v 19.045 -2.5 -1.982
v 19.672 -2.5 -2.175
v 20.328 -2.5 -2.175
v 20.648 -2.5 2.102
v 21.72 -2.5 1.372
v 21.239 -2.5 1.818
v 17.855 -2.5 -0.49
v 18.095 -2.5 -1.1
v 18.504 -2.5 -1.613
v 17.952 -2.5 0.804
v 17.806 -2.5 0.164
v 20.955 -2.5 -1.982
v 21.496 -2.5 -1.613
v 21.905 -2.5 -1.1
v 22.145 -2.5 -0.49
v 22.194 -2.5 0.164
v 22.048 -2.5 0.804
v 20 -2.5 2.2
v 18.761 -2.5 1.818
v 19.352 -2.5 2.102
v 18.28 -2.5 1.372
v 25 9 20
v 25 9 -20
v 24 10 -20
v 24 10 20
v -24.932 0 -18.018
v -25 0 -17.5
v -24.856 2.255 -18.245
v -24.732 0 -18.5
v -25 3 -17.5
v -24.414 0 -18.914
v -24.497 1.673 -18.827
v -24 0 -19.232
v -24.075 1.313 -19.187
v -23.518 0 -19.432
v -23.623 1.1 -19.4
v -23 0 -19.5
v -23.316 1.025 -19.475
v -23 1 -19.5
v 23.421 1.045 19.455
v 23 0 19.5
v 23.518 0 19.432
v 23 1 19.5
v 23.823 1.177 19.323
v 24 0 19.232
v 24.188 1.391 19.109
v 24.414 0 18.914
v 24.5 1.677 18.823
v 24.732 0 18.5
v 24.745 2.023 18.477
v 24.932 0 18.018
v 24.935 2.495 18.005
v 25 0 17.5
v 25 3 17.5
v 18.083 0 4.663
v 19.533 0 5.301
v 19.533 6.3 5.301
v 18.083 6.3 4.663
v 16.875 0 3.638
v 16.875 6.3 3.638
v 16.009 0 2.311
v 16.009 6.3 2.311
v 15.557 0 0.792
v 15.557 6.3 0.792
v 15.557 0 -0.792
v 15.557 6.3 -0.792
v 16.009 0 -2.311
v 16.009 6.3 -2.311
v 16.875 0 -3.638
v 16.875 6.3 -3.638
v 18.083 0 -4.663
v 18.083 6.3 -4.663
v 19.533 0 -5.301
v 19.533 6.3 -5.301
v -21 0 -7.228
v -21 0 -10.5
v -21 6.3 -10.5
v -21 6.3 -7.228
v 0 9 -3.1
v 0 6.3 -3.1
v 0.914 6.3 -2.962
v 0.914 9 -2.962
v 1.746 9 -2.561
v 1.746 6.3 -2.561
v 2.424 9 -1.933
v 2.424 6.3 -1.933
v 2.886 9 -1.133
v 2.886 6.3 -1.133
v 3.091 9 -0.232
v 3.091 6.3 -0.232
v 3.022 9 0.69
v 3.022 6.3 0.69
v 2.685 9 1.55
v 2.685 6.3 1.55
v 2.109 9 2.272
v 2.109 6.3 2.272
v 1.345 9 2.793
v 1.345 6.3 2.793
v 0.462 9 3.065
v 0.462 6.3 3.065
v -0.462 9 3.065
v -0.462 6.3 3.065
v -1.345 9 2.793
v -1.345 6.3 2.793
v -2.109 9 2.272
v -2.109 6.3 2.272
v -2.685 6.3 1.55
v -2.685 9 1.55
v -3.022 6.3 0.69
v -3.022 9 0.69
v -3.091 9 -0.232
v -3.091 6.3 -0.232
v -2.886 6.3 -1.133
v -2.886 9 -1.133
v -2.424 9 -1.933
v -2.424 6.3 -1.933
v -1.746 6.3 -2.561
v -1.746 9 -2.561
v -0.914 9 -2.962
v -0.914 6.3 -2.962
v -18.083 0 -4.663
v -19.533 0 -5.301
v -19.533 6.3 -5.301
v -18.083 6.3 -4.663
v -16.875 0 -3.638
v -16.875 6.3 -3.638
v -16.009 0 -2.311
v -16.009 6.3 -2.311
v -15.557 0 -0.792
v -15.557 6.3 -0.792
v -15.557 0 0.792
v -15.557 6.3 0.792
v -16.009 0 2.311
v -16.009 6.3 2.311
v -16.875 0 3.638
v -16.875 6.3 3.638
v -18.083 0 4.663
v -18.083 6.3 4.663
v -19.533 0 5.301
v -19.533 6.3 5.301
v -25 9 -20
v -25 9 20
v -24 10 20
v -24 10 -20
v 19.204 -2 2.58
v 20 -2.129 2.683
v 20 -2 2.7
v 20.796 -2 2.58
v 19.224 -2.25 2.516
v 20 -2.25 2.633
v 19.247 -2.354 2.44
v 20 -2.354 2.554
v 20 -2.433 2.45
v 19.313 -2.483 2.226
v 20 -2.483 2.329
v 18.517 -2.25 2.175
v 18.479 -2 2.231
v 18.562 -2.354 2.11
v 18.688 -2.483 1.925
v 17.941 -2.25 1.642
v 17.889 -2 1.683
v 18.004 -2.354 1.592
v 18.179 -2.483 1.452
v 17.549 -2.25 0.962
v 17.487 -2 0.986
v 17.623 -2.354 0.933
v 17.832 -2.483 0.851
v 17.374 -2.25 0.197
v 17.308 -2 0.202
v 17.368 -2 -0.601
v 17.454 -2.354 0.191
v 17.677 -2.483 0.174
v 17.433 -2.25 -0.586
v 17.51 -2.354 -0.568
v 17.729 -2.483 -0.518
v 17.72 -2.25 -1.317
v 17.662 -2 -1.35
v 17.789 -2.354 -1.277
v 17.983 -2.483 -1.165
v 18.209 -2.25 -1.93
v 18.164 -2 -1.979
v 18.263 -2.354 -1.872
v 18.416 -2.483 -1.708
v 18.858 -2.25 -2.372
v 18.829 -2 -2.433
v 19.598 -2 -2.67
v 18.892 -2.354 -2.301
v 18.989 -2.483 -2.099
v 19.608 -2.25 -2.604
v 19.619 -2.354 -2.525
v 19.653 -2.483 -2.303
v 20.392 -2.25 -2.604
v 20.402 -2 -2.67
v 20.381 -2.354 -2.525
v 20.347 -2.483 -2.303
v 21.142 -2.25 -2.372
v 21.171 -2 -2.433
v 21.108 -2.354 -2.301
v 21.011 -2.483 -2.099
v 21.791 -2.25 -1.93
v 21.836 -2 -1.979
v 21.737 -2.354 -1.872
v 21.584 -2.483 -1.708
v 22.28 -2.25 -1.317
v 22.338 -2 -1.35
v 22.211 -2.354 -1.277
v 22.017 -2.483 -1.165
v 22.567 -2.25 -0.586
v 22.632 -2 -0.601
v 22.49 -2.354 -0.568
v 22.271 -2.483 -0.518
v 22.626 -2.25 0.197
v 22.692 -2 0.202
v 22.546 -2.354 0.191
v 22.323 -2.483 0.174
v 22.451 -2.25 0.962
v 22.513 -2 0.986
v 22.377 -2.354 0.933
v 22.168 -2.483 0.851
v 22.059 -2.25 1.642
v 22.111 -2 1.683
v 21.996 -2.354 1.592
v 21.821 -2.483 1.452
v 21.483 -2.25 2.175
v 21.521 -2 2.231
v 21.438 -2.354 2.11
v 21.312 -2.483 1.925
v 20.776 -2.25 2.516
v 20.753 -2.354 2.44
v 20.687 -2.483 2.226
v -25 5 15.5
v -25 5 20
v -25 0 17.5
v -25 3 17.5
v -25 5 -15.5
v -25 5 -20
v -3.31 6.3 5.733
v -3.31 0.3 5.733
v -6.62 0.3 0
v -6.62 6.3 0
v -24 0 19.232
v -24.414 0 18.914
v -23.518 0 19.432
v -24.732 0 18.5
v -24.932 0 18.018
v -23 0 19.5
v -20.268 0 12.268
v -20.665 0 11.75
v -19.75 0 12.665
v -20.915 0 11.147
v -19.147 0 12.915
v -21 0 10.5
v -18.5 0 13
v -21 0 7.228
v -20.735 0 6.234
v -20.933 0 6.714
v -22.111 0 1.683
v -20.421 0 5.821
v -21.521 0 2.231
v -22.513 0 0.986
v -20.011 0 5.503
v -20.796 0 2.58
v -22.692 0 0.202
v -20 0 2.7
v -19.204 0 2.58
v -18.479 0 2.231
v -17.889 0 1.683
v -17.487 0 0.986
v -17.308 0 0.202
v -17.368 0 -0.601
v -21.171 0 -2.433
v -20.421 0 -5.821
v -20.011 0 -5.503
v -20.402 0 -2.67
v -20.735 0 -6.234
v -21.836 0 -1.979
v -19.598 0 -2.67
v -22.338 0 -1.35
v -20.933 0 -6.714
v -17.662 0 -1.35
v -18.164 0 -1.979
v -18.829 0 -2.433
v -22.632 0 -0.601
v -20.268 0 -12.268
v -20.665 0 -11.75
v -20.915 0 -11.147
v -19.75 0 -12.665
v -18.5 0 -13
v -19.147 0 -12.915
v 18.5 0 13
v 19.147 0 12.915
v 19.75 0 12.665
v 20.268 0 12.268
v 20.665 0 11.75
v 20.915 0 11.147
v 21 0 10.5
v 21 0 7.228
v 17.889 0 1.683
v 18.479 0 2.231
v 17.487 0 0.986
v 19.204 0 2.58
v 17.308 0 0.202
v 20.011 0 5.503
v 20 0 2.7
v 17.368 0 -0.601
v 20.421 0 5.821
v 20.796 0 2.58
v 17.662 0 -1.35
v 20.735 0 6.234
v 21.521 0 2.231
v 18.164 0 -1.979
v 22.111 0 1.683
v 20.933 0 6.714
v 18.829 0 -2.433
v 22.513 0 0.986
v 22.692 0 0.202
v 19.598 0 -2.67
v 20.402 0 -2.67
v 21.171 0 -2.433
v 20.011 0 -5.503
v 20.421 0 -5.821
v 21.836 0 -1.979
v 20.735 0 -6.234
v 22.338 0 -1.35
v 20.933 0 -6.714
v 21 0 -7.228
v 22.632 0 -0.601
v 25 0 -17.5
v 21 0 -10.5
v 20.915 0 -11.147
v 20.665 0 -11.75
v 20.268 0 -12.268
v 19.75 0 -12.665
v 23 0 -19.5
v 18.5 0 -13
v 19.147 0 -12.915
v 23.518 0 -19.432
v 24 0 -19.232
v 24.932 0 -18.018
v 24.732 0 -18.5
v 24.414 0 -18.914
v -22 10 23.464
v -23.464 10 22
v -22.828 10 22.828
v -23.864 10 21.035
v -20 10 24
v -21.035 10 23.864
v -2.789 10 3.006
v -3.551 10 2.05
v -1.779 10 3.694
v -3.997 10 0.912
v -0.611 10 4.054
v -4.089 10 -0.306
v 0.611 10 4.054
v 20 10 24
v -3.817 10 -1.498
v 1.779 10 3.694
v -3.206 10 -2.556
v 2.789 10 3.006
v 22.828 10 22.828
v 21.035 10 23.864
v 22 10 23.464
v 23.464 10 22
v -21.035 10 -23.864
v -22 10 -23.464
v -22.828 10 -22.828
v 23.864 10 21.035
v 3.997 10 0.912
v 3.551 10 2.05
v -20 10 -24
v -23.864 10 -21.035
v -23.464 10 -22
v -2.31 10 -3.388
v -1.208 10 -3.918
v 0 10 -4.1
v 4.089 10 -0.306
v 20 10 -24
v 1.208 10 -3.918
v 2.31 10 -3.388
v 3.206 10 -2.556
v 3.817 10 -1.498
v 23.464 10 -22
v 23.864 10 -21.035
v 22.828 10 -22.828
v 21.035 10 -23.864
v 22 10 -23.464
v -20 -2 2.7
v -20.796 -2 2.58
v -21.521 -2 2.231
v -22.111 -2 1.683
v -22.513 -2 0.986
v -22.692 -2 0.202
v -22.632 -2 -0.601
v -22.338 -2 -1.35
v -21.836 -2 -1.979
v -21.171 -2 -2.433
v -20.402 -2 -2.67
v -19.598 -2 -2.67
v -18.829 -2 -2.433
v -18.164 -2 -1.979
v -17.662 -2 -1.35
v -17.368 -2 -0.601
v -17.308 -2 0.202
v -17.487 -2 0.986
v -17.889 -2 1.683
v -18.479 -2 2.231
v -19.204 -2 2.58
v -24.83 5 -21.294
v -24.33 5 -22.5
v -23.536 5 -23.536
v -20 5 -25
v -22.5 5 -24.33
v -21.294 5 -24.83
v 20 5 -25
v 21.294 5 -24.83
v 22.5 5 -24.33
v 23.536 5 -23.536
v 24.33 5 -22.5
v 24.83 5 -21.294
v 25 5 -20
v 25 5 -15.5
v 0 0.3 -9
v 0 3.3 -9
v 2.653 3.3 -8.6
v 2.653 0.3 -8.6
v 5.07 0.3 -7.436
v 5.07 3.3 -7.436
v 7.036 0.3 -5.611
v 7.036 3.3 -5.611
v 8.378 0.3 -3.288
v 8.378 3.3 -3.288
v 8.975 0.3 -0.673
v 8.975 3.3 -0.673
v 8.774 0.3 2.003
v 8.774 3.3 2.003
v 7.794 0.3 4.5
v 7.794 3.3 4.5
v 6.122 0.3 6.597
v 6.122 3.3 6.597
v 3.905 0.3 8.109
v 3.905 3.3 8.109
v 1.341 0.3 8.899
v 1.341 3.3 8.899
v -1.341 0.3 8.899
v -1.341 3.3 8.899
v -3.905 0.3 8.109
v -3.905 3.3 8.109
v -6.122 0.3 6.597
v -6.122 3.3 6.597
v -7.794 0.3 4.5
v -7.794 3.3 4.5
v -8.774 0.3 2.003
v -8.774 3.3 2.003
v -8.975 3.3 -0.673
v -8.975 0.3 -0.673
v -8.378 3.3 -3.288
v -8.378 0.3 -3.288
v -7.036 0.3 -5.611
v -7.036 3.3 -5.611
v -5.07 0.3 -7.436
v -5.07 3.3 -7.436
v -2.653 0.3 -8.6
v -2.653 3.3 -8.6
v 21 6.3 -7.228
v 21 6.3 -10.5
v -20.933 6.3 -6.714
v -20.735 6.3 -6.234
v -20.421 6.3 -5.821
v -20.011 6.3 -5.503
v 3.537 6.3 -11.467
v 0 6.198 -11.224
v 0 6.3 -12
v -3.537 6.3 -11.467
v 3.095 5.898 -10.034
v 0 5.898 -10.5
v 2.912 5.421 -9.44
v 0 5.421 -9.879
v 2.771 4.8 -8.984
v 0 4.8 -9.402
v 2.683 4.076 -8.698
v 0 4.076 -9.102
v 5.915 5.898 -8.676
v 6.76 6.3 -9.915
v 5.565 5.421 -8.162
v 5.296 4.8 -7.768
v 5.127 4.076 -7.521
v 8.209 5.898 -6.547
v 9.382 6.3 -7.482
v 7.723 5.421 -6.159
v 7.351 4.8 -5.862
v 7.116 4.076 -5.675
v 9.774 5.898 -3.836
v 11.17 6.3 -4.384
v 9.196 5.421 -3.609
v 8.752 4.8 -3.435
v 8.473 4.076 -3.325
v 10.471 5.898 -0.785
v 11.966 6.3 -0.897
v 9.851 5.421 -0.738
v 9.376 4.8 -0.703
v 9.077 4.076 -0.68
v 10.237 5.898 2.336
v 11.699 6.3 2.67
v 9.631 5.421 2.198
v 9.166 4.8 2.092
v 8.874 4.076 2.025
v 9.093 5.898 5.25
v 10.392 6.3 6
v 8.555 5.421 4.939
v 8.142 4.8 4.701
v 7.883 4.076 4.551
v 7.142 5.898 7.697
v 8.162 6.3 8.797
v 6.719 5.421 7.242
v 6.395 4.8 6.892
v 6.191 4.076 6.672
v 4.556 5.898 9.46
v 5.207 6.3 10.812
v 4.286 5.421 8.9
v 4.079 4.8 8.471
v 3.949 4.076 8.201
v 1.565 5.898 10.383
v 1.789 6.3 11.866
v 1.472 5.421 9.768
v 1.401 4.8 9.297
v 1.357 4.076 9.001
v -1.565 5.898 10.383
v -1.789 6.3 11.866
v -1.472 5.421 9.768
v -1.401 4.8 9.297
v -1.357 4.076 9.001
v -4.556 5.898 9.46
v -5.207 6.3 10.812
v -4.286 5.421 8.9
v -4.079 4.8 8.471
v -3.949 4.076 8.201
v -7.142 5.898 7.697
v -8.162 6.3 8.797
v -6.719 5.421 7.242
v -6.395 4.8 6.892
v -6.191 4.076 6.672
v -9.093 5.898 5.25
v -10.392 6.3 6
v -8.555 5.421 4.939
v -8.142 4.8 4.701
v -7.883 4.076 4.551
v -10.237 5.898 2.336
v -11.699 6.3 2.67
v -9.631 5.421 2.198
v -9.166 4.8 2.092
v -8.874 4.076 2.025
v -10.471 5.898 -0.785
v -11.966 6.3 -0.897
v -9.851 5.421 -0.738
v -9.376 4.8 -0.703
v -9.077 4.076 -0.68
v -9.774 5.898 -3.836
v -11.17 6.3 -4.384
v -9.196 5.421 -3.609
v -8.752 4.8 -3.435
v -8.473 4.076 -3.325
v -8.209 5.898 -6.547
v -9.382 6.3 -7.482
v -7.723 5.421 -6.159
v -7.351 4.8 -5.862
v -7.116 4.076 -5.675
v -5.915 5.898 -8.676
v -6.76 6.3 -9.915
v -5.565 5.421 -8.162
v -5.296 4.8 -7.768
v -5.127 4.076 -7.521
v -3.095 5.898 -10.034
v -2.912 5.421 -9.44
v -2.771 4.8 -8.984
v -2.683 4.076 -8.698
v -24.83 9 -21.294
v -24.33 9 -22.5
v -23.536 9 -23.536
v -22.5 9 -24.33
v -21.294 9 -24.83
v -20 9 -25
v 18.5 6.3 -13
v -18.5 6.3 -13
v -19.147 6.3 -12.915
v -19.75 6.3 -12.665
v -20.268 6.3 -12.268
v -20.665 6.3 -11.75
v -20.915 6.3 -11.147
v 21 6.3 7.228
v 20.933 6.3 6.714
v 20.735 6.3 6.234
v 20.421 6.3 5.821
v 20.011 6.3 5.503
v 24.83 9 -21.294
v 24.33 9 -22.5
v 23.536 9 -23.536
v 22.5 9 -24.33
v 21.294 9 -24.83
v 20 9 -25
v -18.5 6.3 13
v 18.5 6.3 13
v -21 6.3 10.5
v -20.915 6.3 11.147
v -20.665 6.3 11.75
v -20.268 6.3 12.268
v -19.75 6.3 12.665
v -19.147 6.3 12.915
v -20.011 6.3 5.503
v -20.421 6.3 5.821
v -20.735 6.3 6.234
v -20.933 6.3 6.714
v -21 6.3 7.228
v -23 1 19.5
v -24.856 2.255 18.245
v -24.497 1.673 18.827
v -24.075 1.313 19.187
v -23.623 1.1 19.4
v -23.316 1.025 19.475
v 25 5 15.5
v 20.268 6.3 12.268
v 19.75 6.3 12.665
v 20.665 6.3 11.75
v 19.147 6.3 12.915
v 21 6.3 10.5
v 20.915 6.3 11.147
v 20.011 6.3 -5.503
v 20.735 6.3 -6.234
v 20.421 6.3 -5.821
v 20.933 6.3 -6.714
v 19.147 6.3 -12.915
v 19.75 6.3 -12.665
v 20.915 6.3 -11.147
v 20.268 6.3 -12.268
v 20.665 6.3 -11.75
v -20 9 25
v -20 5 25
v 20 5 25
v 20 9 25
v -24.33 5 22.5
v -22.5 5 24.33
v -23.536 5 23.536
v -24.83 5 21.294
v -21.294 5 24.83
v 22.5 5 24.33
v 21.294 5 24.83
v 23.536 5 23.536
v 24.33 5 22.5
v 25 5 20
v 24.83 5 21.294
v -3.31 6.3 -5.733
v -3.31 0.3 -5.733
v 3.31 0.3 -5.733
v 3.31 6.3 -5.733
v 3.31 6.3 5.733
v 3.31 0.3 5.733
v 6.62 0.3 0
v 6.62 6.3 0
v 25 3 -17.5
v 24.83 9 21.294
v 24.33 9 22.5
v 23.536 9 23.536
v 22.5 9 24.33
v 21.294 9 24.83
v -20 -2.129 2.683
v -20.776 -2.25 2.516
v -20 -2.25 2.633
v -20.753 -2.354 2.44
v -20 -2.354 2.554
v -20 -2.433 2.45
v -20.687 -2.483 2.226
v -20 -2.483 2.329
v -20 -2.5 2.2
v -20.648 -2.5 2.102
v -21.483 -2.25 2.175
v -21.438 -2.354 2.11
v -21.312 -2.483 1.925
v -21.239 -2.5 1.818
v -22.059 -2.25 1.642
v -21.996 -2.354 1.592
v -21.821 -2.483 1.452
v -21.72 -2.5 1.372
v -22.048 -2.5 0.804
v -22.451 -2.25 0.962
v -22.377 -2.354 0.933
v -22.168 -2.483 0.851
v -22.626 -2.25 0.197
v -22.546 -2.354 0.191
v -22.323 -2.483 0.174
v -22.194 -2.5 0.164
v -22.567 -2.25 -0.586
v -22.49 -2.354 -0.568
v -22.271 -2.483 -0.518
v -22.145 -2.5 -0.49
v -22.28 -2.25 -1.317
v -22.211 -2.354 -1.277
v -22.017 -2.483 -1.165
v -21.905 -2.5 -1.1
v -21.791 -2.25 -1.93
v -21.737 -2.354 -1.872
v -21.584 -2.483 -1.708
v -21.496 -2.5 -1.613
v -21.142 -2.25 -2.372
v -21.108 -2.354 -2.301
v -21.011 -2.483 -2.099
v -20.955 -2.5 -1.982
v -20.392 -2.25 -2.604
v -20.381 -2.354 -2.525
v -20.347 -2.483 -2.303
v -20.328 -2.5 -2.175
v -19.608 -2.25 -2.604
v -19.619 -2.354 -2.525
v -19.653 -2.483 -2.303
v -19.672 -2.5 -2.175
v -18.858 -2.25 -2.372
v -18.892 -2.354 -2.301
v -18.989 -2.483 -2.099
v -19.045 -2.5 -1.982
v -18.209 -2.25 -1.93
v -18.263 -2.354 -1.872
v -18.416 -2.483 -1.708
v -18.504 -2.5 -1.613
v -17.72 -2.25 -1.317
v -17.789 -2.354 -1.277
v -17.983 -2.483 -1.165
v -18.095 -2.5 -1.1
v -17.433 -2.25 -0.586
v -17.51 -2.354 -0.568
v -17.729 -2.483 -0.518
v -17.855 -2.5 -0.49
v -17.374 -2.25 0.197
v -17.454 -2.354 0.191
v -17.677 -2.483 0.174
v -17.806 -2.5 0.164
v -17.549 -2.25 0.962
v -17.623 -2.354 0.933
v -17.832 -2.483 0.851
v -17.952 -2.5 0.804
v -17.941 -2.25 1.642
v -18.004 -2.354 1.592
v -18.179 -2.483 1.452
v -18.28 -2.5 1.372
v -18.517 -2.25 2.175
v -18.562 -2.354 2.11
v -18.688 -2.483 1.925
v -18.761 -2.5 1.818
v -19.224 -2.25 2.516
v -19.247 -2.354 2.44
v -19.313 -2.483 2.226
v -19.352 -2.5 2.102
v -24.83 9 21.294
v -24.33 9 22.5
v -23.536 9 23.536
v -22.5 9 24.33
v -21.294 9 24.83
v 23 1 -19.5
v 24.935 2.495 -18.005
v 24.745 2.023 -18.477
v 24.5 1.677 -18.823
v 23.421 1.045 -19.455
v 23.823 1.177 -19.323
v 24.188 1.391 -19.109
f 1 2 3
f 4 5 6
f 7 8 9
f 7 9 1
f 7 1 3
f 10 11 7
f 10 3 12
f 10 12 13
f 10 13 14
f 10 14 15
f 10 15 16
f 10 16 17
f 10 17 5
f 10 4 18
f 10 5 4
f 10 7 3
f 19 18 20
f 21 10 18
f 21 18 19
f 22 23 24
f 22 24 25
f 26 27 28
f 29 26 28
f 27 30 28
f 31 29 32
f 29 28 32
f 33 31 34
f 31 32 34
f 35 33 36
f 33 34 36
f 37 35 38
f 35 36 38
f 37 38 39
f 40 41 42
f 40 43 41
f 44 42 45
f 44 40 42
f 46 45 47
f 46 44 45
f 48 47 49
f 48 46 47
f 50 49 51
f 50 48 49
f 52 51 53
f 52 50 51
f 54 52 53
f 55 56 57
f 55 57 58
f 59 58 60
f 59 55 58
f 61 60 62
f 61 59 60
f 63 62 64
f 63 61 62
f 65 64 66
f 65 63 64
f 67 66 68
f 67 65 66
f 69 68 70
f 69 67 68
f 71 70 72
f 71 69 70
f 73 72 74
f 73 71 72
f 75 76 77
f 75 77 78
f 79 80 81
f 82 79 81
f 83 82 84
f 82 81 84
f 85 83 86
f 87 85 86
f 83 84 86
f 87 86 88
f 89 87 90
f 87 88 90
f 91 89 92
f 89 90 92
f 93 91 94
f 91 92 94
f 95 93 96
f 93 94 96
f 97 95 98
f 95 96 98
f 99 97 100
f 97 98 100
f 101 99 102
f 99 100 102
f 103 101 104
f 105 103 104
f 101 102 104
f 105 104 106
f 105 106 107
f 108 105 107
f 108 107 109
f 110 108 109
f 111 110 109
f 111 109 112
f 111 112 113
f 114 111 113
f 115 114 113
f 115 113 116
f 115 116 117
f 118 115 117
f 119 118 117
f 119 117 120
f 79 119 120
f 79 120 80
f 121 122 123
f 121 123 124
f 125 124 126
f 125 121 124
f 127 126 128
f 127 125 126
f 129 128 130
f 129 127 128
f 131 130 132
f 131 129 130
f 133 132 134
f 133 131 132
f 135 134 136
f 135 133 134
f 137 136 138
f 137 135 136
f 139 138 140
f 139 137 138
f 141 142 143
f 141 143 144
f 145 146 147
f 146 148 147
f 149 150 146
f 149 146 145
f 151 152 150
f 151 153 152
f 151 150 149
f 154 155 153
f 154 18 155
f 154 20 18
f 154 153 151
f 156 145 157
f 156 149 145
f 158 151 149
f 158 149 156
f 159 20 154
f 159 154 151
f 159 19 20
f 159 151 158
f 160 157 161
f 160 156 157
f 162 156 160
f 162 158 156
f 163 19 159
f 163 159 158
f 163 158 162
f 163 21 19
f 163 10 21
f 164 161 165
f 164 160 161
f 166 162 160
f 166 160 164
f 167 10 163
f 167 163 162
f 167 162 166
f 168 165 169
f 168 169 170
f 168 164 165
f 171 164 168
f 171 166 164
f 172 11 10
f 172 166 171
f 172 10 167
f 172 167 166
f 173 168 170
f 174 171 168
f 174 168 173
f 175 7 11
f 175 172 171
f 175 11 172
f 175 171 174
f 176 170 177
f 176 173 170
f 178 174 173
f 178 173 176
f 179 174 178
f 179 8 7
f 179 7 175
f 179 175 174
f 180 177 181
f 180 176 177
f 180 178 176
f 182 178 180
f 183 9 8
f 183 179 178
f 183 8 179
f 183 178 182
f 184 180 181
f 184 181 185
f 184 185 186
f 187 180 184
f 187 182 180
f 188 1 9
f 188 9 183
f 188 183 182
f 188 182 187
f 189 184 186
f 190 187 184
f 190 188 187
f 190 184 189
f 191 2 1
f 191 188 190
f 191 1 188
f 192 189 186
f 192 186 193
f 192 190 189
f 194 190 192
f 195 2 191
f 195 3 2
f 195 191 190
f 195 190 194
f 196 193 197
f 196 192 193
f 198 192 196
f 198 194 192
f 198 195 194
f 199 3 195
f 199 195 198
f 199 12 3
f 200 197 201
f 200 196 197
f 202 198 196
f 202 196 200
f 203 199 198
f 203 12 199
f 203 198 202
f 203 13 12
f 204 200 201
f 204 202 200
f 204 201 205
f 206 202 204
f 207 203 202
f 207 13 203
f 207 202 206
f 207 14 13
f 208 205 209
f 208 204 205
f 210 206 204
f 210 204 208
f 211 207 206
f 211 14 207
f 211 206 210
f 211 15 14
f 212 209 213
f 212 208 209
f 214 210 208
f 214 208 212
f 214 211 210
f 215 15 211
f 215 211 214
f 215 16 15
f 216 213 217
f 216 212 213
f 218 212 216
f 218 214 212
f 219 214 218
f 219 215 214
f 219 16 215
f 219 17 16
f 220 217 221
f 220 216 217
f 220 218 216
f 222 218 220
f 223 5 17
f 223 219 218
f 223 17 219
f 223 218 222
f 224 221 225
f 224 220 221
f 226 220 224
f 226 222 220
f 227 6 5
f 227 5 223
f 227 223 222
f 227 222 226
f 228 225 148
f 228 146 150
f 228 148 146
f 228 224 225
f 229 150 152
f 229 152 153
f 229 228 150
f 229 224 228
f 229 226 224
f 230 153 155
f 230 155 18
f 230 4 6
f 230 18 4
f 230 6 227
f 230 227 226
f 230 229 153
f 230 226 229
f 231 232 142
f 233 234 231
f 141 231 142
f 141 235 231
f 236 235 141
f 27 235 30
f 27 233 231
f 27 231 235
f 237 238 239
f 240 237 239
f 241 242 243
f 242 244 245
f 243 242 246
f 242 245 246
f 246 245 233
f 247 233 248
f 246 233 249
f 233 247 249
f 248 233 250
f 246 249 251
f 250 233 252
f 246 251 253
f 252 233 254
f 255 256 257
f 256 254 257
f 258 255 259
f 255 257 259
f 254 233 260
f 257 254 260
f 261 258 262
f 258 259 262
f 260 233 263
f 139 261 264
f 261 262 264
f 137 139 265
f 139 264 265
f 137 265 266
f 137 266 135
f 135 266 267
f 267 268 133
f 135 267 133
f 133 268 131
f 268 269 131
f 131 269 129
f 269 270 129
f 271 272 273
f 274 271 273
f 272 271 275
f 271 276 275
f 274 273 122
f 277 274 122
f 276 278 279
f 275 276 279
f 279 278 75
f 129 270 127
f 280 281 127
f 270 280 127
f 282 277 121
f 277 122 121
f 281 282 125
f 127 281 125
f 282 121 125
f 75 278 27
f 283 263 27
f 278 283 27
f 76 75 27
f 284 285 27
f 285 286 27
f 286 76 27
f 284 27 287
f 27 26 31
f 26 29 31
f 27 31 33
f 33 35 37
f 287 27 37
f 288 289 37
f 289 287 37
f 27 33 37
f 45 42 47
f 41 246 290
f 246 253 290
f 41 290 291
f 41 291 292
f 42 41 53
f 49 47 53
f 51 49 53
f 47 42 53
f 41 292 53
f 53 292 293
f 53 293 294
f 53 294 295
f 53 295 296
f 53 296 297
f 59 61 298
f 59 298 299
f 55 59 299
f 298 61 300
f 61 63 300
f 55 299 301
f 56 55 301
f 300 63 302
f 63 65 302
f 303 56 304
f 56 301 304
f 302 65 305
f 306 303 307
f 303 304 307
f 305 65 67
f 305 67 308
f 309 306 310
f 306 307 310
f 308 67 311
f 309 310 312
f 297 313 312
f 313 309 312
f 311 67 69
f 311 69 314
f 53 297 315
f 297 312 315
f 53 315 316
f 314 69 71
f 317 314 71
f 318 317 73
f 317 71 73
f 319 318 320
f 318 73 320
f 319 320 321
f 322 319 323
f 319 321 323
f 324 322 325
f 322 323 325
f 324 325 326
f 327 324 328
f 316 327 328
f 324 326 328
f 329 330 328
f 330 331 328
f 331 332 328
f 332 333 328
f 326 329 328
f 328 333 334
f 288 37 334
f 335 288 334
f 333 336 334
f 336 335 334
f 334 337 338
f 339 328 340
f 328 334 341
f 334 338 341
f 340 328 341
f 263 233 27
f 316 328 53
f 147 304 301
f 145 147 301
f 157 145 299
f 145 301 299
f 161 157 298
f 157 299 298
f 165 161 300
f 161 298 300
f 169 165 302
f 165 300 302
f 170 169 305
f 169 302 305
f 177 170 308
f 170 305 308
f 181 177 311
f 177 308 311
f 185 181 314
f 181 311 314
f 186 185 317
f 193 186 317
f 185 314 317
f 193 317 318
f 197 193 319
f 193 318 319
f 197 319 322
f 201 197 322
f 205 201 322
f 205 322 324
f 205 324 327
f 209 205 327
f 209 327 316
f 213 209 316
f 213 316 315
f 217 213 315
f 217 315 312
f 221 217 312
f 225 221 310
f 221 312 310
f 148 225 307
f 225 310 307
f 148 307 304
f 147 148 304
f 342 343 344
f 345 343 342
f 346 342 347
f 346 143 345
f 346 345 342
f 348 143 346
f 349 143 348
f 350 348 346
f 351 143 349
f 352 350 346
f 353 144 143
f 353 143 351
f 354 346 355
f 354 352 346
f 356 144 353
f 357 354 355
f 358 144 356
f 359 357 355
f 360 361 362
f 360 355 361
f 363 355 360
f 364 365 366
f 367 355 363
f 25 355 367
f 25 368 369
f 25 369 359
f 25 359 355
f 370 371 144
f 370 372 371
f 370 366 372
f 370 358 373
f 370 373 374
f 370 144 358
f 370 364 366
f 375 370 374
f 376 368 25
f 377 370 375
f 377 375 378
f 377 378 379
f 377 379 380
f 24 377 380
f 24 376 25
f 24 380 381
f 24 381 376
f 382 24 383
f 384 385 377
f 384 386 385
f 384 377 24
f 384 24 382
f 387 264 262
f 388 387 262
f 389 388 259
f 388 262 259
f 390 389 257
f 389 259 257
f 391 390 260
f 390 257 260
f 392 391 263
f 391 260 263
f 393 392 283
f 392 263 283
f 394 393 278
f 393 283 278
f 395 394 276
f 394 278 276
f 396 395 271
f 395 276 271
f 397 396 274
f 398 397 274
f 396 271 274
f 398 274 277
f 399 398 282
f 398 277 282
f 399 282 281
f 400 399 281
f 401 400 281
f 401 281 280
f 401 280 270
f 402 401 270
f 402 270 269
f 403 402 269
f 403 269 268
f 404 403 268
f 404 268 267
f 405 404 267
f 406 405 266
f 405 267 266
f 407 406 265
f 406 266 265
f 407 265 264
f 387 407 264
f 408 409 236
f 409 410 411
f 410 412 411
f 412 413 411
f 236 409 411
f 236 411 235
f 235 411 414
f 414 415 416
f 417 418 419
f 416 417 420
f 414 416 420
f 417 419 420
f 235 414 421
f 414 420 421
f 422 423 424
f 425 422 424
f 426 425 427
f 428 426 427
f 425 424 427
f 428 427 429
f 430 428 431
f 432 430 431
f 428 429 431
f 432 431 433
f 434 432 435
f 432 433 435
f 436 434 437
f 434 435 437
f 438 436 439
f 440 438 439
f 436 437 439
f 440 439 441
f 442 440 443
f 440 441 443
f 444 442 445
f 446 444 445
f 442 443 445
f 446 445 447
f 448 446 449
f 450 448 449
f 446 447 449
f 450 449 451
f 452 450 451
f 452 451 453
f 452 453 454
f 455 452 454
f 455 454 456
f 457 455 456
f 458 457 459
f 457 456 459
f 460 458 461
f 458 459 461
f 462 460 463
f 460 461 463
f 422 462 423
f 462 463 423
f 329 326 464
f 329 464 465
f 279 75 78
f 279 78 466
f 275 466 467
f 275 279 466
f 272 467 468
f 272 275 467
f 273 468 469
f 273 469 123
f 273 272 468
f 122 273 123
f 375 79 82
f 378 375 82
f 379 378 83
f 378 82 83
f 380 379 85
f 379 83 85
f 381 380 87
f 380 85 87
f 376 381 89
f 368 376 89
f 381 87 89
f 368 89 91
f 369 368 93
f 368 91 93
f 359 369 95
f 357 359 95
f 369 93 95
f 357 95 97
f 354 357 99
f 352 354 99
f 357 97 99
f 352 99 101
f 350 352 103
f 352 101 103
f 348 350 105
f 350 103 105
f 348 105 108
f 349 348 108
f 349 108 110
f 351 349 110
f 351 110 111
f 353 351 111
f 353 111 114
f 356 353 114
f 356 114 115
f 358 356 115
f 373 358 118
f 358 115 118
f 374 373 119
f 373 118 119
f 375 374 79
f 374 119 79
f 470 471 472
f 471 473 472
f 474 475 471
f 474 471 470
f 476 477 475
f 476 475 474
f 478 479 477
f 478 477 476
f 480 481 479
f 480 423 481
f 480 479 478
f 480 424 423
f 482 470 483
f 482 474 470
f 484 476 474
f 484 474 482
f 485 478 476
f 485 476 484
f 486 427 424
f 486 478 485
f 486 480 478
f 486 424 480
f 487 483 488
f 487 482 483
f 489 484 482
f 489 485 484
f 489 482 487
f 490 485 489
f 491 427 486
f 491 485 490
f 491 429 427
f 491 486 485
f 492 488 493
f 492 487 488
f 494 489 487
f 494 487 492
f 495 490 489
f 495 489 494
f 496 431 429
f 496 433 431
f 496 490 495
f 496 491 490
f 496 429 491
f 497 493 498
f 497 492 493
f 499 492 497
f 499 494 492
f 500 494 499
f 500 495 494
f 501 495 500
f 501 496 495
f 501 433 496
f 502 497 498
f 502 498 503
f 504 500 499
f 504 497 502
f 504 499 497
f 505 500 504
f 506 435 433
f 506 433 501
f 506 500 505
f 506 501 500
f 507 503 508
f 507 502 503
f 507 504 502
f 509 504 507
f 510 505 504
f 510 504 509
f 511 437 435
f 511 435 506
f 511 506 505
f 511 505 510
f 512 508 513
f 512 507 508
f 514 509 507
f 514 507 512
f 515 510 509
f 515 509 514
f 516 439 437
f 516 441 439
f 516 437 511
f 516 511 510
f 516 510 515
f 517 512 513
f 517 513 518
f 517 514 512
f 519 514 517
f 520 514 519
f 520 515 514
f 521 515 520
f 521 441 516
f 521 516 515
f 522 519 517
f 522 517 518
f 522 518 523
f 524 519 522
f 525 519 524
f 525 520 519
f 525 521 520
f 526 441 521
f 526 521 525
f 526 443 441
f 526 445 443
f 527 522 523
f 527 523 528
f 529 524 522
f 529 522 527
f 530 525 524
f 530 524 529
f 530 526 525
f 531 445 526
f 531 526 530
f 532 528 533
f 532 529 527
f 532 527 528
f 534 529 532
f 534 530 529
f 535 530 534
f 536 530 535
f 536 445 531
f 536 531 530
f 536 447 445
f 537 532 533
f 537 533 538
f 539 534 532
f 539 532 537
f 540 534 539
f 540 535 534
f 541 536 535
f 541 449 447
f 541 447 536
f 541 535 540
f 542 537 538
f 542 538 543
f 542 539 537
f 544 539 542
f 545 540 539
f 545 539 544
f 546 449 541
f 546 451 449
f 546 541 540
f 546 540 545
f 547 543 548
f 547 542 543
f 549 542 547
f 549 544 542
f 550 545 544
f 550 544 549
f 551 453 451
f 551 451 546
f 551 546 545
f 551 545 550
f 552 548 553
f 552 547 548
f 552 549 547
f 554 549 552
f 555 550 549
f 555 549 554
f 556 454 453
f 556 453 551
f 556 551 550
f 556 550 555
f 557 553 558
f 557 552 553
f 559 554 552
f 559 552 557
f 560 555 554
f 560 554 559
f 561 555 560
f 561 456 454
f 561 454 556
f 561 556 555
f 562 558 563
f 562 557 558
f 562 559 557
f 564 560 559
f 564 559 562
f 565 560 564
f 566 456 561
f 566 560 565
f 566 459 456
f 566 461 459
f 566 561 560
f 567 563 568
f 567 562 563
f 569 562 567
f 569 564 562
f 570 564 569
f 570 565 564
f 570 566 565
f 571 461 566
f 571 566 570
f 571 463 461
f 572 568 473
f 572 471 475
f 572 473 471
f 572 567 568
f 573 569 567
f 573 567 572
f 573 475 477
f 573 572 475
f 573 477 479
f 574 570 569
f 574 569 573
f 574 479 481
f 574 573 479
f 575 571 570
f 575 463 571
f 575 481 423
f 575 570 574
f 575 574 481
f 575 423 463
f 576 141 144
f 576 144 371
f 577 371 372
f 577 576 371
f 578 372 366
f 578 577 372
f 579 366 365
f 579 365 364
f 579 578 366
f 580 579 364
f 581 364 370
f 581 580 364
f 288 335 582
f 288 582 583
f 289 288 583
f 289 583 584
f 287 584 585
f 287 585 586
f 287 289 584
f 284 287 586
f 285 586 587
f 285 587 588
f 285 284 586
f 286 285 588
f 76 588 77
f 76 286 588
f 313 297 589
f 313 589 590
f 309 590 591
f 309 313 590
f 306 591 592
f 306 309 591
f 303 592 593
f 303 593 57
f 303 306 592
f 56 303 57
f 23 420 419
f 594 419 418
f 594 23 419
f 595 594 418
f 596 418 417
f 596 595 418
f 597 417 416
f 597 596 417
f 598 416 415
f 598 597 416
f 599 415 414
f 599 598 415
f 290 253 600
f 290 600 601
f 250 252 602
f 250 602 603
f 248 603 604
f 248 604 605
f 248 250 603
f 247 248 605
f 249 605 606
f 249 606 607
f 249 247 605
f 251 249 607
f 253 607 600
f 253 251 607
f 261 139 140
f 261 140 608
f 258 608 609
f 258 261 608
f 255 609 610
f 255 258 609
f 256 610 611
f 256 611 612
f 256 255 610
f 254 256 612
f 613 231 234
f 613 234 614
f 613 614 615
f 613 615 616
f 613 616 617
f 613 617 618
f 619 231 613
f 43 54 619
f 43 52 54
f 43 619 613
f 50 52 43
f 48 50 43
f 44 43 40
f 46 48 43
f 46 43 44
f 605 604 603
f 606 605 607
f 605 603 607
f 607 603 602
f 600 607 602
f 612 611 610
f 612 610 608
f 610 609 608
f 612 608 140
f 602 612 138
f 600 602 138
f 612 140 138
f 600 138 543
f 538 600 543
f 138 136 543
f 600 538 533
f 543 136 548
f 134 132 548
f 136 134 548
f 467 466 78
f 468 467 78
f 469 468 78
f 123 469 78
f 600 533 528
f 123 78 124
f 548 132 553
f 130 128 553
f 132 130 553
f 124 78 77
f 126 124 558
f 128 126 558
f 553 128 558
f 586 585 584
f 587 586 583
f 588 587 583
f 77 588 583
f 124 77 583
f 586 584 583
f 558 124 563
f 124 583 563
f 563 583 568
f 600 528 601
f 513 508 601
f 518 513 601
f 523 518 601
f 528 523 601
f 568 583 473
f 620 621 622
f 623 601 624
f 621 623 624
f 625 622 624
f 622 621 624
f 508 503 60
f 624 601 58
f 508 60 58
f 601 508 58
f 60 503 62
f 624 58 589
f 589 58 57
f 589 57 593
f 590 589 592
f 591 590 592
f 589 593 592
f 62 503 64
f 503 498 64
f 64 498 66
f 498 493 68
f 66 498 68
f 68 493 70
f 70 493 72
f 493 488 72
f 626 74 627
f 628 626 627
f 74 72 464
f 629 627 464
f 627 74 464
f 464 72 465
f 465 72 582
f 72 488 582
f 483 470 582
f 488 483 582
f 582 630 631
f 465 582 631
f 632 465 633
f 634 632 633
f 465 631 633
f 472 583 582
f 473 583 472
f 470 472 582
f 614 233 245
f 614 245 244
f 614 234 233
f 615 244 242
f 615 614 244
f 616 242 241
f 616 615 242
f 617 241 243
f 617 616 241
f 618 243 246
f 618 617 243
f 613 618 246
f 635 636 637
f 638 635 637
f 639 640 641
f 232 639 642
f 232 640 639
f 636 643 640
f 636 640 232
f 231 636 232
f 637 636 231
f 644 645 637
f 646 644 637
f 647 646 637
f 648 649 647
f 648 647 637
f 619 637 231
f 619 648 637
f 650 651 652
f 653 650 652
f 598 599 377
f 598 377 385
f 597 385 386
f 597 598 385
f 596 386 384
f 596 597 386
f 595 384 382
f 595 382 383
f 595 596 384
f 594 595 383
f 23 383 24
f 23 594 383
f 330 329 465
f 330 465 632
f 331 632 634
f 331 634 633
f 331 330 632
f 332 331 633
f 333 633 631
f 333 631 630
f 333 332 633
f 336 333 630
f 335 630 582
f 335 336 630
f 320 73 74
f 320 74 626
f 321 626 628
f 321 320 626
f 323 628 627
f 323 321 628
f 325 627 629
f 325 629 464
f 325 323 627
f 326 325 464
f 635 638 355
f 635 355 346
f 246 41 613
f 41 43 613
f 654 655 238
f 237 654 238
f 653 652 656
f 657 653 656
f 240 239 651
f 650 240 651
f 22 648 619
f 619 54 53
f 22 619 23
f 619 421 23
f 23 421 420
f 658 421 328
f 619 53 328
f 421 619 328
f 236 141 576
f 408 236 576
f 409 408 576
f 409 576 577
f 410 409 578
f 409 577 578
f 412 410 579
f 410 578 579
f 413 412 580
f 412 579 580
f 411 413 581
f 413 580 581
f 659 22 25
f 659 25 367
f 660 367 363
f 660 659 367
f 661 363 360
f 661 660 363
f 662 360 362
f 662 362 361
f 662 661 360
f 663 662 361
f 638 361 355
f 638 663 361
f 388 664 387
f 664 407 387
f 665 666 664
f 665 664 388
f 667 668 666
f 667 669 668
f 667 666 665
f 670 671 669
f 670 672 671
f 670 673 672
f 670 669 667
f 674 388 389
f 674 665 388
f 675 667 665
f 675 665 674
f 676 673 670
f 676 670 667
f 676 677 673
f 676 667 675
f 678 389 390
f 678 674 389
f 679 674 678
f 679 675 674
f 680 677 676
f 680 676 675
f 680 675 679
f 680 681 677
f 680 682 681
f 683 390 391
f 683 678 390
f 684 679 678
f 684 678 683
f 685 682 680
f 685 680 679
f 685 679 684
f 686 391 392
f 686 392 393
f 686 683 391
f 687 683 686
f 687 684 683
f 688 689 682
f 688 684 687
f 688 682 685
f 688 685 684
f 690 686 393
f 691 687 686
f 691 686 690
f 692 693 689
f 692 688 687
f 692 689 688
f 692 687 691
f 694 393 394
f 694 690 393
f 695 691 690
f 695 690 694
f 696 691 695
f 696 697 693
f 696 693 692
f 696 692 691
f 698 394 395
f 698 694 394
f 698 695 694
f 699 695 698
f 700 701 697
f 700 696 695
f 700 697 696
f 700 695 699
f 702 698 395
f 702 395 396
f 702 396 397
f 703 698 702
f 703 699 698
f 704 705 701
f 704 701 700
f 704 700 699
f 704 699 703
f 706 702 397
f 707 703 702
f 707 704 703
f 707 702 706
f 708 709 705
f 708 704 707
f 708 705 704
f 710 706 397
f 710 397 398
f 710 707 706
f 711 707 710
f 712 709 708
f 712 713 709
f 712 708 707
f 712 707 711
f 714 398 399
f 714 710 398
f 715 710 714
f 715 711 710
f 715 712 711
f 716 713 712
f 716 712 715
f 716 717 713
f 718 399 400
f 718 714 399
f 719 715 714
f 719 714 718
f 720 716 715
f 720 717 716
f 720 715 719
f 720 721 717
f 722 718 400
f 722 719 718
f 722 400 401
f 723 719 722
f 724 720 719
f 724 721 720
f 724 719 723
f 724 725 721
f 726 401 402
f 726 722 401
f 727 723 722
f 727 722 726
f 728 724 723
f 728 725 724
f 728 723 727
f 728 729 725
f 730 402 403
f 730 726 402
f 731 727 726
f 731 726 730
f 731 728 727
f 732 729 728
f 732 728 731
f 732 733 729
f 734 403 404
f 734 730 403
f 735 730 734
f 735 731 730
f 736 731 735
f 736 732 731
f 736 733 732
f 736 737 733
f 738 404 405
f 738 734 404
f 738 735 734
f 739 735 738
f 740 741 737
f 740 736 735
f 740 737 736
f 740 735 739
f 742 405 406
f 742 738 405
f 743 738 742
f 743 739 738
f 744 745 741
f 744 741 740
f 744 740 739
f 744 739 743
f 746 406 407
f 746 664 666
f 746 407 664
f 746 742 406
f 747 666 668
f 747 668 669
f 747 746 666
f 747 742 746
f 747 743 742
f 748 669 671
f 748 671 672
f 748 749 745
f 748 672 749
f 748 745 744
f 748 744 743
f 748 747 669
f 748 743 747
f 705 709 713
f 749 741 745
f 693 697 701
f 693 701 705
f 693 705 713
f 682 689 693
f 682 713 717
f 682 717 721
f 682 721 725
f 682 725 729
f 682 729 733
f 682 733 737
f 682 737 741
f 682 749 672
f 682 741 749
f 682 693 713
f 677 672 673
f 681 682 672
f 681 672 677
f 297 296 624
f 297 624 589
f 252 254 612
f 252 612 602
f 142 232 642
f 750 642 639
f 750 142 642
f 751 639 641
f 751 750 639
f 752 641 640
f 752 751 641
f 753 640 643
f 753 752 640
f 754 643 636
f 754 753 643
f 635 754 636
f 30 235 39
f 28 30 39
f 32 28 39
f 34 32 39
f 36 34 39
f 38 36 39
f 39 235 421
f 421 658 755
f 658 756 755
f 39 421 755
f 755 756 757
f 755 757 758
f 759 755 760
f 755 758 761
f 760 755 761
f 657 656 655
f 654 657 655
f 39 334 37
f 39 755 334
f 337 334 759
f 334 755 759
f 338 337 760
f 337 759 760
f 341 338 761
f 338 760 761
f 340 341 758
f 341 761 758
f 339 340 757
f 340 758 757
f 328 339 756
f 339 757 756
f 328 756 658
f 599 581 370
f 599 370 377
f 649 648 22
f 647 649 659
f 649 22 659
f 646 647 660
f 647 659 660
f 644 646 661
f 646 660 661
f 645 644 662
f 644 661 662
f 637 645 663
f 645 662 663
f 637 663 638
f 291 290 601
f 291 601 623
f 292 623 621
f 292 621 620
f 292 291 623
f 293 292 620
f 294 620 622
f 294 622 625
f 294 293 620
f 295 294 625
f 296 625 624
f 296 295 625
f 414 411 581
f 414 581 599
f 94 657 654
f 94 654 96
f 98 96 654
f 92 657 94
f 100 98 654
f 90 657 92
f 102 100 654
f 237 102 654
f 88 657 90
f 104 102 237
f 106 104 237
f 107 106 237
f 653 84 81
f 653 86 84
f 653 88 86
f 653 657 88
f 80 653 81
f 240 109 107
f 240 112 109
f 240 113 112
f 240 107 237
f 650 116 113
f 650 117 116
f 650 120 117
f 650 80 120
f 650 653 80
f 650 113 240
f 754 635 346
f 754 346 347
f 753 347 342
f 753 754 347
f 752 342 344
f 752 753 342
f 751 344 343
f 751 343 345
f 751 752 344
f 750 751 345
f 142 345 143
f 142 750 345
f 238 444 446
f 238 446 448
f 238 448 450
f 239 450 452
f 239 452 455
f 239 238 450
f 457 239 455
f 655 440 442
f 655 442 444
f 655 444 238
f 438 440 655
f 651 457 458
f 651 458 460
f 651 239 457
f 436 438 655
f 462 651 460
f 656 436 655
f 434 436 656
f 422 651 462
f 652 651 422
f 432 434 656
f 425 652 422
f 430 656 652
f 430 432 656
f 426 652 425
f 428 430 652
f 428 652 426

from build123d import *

# Parameters (mm, degrees)
SKETCH1_W           = 50
SKETCH1_H           = 50
BOSS_EXTRUDE1_DEPTH = 10
CUT_EXTRUDE3_DEPTH  = 6.3
SKETCH5_R           = 9
SKETCH5_R_2         = 3.1
BOSS_EXTRUDE2_DEPTH = 6
SKETCH6_R           = 2.7
BOSS_EXTRUDE3_DEPTH = 2.5
FILLET1_R           = 0.5
CUT_EXTRUDE4_DEPTH  = 57.789083458
FILLET2_R           = 5
CHAMFER1_SIZE       = 1
CHAMFER2_SIZE       = 1
CHAMFER2_SIZE2      = 1.414213562
FILLET3_R           = 2
SKETCH9_R           = 3.1
CUT_EXTRUDE5_DEPTH  = 37.434050008
CHAMFER3_SIZE       = 1
CUT_EXTRUDE6_DEPTH  = 6
FILLET4_R           = 3


with BuildPart() as part:
    # Sketch1 → Boss-Extrude1 (new body)
    with BuildSketch(Plane(origin=(0, 0, 0), x_dir=(1, 0, 0), z_dir=(0, 1, 0))):
        Rectangle(SKETCH1_W, SKETCH1_H)
    extrude(amount=BOSS_EXTRUDE1_DEPTH)

    # Sketch4 → Cut-Extrude3 (cut)
    with BuildSketch(Plane(origin=(0, 0, 0), x_dir=(-1, 0, 0), z_dir=(0, -1, 0))):
        with BuildLine():
            Line((21, -7.228416147), (21, -10.5))
            ThreePointArc((21, -10.5), (20.267766953, -12.267766953), (18.5, -13))
            Line((18.5, -13), (-18.5, -13))
            ThreePointArc((-18.5, -13), (-20.267766953, -12.267766953), (-21, -10.5))
            Line((-21, -10.5), (-21, -7.228416147))
            ThreePointArc((-21, -7.228416147), (-20.591644852, -6.017356006), (-19.533333333, -5.300838508))
            ThreePointArc((-19.533333333, -5.300838508), (-15.5, 0), (-19.533333333, 5.300838508))
            ThreePointArc((-19.533333333, 5.300838508), (-20.591644852, 6.017356006), (-21, 7.228416147))
            Line((-21, 7.228416147), (-21, 10.5))
            ThreePointArc((-21, 10.5), (-20.267766953, 12.267766953), (-18.5, 13))
            Line((-18.5, 13), (18.5, 13))
            ThreePointArc((18.5, 13), (20.267766953, 12.267766953), (21, 10.5))
            Line((21, 10.5), (21, 7.228416147))
            ThreePointArc((21, 7.228416147), (20.591644852, 6.017356006), (19.533333333, 5.300838508))
            ThreePointArc((19.533333333, 5.300838508), (15.5, 0), (19.533333333, -5.300838508))
            ThreePointArc((19.533333333, -5.300838508), (20.591644852, -6.017356006), (21, -7.228416147))
        make_face()
    extrude(amount=-CUT_EXTRUDE3_DEPTH, mode=Mode.SUBTRACT)

    # Sketch5 → Boss-Extrude2 (add)
    with BuildSketch(Plane(origin=(0, 6.3, 0), x_dir=(-1, 0, 0), z_dir=(0, -1, 0))):
        with Locations(Location((0, 0, 0), (0, 0, 90))):
            Circle(SKETCH5_R)
        with Locations(Location((0, 0, 0), (0, 0, 90))):
            Circle(SKETCH5_R_2, mode=Mode.SUBTRACT)
    extrude(amount=BOSS_EXTRUDE2_DEPTH)

    # Sketch6 → Boss-Extrude3 (add)
    with BuildSketch(Plane.XZ):
        with Locations(Location((-20, 0, 0), (0, 0, 90))):
            Circle(SKETCH6_R)
        with Locations(Location((20, 0, 0), (0, 0, 90))):
            Circle(SKETCH6_R)
    extrude(amount=BOSS_EXTRUDE3_DEPTH)

    # Fillet1
    fillet1_edges = [part.edges().sort_by_distance(p)[0] for p in [
        (-20, -2.5, -2.7),
        (20, -2.5, -2.7),
    ]]
    fillet(fillet1_edges, radius=FILLET1_R)

    # Sketch8 → Cut-Extrude4 (cut, through all)
    with BuildSketch(Plane(origin=(25, 0, 0), x_dir=(0, 0, -1), z_dir=(1, 0, 0))):
        Polygon((-25, 0), (-25, 5), (-15.5, 5), (-20.5, 0), align=None)
        Polygon((25, 0), (25, 5), (15.5, 5), (20.5, 0), align=None)
    extrude(amount=-CUT_EXTRUDE4_DEPTH, mode=Mode.SUBTRACT)

    # Fillet2
    fillet2_edges = [part.edges().sort_by_distance(p)[0] for p in [
        (-25, 7.5, -25),
        (25, 7.5, -25),
        (25, 7.5, 25),
        (-25, 7.5, 25),
    ]]
    fillet(fillet2_edges, radius=FILLET2_R)

    # Chamfer1
    chamfer1_edges = [part.edges().sort_by_distance(p)[0] for p in [
        (0, 10, -25),
        (25, 10, 0),
        (-25, 10, 0),
        (0, 10, 25),
        (23.535533906, 10, 23.535533906),
        (-23.535533906, 10, 23.535533906),
        (-23.535533906, 10, -23.535533906),
        (23.535533906, 10, -23.535533906),
    ]]
    chamfer(chamfer1_edges, length=CHAMFER1_SIZE)

    # Chamfer2
    chamfer2_edges = [part.edges().sort_by_distance(p)[0] for p in [
        (0, 0, 20.5),
        (0, 0, -20.5),
    ]]
    chamfer2_side = [part.faces().sort_by_distance(p)[0] for p in [
        (24.353393474, 0, 0),
    ]]
    chamfer(chamfer2_edges, length=CHAMFER2_SIZE, length2=CHAMFER2_SIZE2, reference=chamfer2_side[0])

    # Fillet3
    fillet3_edges = [part.edges().sort_by_distance(p)[0] for p in [
        (25, 0.5, -19.5),
        (25, 0.5, 19.5),
        (-25, 0.5, -19.5),
        (-25, 0.5, 19.5),
    ]]
    fillet(fillet3_edges, radius=FILLET3_R)

    # Sketch9 → Cut-Extrude5 (cut, through all)
    with BuildSketch(Plane(origin=(0, 6.3, 0), x_dir=(-1, 0, 0), z_dir=(0, -1, 0))):
        with Locations(Location((0, 0, 0), (0, 0, 90))):
            Circle(SKETCH9_R)
    extrude(amount=-CUT_EXTRUDE5_DEPTH, mode=Mode.SUBTRACT)

    # Chamfer3
    chamfer3_edges = [part.edges().sort_by_distance(p)[0] for p in [
        (0, 10, 3.1),
    ]]
    chamfer(chamfer3_edges, length=CHAMFER3_SIZE)

    # Sketch10 → Cut-Extrude6 (cut)
    with BuildSketch(Plane(origin=(0, 0.3, 0), x_dir=(-1, 0, 0), z_dir=(0, -1, 0))):
        Polygon((3.31, -5.733088173), (6.62, 0), (3.31, 5.733088173), (-3.31, 5.733088173), (-6.62, 0), (-3.31, -5.733088173), align=None)
    extrude(amount=-CUT_EXTRUDE6_DEPTH, mode=Mode.SUBTRACT)

    # Fillet4
    fillet4_edges = [part.edges().sort_by_distance(p)[0] for p in [
        (0, 6.3, 9),
    ]]
    fillet(fillet4_edges, radius=FILLET4_R)


solid = part.part
